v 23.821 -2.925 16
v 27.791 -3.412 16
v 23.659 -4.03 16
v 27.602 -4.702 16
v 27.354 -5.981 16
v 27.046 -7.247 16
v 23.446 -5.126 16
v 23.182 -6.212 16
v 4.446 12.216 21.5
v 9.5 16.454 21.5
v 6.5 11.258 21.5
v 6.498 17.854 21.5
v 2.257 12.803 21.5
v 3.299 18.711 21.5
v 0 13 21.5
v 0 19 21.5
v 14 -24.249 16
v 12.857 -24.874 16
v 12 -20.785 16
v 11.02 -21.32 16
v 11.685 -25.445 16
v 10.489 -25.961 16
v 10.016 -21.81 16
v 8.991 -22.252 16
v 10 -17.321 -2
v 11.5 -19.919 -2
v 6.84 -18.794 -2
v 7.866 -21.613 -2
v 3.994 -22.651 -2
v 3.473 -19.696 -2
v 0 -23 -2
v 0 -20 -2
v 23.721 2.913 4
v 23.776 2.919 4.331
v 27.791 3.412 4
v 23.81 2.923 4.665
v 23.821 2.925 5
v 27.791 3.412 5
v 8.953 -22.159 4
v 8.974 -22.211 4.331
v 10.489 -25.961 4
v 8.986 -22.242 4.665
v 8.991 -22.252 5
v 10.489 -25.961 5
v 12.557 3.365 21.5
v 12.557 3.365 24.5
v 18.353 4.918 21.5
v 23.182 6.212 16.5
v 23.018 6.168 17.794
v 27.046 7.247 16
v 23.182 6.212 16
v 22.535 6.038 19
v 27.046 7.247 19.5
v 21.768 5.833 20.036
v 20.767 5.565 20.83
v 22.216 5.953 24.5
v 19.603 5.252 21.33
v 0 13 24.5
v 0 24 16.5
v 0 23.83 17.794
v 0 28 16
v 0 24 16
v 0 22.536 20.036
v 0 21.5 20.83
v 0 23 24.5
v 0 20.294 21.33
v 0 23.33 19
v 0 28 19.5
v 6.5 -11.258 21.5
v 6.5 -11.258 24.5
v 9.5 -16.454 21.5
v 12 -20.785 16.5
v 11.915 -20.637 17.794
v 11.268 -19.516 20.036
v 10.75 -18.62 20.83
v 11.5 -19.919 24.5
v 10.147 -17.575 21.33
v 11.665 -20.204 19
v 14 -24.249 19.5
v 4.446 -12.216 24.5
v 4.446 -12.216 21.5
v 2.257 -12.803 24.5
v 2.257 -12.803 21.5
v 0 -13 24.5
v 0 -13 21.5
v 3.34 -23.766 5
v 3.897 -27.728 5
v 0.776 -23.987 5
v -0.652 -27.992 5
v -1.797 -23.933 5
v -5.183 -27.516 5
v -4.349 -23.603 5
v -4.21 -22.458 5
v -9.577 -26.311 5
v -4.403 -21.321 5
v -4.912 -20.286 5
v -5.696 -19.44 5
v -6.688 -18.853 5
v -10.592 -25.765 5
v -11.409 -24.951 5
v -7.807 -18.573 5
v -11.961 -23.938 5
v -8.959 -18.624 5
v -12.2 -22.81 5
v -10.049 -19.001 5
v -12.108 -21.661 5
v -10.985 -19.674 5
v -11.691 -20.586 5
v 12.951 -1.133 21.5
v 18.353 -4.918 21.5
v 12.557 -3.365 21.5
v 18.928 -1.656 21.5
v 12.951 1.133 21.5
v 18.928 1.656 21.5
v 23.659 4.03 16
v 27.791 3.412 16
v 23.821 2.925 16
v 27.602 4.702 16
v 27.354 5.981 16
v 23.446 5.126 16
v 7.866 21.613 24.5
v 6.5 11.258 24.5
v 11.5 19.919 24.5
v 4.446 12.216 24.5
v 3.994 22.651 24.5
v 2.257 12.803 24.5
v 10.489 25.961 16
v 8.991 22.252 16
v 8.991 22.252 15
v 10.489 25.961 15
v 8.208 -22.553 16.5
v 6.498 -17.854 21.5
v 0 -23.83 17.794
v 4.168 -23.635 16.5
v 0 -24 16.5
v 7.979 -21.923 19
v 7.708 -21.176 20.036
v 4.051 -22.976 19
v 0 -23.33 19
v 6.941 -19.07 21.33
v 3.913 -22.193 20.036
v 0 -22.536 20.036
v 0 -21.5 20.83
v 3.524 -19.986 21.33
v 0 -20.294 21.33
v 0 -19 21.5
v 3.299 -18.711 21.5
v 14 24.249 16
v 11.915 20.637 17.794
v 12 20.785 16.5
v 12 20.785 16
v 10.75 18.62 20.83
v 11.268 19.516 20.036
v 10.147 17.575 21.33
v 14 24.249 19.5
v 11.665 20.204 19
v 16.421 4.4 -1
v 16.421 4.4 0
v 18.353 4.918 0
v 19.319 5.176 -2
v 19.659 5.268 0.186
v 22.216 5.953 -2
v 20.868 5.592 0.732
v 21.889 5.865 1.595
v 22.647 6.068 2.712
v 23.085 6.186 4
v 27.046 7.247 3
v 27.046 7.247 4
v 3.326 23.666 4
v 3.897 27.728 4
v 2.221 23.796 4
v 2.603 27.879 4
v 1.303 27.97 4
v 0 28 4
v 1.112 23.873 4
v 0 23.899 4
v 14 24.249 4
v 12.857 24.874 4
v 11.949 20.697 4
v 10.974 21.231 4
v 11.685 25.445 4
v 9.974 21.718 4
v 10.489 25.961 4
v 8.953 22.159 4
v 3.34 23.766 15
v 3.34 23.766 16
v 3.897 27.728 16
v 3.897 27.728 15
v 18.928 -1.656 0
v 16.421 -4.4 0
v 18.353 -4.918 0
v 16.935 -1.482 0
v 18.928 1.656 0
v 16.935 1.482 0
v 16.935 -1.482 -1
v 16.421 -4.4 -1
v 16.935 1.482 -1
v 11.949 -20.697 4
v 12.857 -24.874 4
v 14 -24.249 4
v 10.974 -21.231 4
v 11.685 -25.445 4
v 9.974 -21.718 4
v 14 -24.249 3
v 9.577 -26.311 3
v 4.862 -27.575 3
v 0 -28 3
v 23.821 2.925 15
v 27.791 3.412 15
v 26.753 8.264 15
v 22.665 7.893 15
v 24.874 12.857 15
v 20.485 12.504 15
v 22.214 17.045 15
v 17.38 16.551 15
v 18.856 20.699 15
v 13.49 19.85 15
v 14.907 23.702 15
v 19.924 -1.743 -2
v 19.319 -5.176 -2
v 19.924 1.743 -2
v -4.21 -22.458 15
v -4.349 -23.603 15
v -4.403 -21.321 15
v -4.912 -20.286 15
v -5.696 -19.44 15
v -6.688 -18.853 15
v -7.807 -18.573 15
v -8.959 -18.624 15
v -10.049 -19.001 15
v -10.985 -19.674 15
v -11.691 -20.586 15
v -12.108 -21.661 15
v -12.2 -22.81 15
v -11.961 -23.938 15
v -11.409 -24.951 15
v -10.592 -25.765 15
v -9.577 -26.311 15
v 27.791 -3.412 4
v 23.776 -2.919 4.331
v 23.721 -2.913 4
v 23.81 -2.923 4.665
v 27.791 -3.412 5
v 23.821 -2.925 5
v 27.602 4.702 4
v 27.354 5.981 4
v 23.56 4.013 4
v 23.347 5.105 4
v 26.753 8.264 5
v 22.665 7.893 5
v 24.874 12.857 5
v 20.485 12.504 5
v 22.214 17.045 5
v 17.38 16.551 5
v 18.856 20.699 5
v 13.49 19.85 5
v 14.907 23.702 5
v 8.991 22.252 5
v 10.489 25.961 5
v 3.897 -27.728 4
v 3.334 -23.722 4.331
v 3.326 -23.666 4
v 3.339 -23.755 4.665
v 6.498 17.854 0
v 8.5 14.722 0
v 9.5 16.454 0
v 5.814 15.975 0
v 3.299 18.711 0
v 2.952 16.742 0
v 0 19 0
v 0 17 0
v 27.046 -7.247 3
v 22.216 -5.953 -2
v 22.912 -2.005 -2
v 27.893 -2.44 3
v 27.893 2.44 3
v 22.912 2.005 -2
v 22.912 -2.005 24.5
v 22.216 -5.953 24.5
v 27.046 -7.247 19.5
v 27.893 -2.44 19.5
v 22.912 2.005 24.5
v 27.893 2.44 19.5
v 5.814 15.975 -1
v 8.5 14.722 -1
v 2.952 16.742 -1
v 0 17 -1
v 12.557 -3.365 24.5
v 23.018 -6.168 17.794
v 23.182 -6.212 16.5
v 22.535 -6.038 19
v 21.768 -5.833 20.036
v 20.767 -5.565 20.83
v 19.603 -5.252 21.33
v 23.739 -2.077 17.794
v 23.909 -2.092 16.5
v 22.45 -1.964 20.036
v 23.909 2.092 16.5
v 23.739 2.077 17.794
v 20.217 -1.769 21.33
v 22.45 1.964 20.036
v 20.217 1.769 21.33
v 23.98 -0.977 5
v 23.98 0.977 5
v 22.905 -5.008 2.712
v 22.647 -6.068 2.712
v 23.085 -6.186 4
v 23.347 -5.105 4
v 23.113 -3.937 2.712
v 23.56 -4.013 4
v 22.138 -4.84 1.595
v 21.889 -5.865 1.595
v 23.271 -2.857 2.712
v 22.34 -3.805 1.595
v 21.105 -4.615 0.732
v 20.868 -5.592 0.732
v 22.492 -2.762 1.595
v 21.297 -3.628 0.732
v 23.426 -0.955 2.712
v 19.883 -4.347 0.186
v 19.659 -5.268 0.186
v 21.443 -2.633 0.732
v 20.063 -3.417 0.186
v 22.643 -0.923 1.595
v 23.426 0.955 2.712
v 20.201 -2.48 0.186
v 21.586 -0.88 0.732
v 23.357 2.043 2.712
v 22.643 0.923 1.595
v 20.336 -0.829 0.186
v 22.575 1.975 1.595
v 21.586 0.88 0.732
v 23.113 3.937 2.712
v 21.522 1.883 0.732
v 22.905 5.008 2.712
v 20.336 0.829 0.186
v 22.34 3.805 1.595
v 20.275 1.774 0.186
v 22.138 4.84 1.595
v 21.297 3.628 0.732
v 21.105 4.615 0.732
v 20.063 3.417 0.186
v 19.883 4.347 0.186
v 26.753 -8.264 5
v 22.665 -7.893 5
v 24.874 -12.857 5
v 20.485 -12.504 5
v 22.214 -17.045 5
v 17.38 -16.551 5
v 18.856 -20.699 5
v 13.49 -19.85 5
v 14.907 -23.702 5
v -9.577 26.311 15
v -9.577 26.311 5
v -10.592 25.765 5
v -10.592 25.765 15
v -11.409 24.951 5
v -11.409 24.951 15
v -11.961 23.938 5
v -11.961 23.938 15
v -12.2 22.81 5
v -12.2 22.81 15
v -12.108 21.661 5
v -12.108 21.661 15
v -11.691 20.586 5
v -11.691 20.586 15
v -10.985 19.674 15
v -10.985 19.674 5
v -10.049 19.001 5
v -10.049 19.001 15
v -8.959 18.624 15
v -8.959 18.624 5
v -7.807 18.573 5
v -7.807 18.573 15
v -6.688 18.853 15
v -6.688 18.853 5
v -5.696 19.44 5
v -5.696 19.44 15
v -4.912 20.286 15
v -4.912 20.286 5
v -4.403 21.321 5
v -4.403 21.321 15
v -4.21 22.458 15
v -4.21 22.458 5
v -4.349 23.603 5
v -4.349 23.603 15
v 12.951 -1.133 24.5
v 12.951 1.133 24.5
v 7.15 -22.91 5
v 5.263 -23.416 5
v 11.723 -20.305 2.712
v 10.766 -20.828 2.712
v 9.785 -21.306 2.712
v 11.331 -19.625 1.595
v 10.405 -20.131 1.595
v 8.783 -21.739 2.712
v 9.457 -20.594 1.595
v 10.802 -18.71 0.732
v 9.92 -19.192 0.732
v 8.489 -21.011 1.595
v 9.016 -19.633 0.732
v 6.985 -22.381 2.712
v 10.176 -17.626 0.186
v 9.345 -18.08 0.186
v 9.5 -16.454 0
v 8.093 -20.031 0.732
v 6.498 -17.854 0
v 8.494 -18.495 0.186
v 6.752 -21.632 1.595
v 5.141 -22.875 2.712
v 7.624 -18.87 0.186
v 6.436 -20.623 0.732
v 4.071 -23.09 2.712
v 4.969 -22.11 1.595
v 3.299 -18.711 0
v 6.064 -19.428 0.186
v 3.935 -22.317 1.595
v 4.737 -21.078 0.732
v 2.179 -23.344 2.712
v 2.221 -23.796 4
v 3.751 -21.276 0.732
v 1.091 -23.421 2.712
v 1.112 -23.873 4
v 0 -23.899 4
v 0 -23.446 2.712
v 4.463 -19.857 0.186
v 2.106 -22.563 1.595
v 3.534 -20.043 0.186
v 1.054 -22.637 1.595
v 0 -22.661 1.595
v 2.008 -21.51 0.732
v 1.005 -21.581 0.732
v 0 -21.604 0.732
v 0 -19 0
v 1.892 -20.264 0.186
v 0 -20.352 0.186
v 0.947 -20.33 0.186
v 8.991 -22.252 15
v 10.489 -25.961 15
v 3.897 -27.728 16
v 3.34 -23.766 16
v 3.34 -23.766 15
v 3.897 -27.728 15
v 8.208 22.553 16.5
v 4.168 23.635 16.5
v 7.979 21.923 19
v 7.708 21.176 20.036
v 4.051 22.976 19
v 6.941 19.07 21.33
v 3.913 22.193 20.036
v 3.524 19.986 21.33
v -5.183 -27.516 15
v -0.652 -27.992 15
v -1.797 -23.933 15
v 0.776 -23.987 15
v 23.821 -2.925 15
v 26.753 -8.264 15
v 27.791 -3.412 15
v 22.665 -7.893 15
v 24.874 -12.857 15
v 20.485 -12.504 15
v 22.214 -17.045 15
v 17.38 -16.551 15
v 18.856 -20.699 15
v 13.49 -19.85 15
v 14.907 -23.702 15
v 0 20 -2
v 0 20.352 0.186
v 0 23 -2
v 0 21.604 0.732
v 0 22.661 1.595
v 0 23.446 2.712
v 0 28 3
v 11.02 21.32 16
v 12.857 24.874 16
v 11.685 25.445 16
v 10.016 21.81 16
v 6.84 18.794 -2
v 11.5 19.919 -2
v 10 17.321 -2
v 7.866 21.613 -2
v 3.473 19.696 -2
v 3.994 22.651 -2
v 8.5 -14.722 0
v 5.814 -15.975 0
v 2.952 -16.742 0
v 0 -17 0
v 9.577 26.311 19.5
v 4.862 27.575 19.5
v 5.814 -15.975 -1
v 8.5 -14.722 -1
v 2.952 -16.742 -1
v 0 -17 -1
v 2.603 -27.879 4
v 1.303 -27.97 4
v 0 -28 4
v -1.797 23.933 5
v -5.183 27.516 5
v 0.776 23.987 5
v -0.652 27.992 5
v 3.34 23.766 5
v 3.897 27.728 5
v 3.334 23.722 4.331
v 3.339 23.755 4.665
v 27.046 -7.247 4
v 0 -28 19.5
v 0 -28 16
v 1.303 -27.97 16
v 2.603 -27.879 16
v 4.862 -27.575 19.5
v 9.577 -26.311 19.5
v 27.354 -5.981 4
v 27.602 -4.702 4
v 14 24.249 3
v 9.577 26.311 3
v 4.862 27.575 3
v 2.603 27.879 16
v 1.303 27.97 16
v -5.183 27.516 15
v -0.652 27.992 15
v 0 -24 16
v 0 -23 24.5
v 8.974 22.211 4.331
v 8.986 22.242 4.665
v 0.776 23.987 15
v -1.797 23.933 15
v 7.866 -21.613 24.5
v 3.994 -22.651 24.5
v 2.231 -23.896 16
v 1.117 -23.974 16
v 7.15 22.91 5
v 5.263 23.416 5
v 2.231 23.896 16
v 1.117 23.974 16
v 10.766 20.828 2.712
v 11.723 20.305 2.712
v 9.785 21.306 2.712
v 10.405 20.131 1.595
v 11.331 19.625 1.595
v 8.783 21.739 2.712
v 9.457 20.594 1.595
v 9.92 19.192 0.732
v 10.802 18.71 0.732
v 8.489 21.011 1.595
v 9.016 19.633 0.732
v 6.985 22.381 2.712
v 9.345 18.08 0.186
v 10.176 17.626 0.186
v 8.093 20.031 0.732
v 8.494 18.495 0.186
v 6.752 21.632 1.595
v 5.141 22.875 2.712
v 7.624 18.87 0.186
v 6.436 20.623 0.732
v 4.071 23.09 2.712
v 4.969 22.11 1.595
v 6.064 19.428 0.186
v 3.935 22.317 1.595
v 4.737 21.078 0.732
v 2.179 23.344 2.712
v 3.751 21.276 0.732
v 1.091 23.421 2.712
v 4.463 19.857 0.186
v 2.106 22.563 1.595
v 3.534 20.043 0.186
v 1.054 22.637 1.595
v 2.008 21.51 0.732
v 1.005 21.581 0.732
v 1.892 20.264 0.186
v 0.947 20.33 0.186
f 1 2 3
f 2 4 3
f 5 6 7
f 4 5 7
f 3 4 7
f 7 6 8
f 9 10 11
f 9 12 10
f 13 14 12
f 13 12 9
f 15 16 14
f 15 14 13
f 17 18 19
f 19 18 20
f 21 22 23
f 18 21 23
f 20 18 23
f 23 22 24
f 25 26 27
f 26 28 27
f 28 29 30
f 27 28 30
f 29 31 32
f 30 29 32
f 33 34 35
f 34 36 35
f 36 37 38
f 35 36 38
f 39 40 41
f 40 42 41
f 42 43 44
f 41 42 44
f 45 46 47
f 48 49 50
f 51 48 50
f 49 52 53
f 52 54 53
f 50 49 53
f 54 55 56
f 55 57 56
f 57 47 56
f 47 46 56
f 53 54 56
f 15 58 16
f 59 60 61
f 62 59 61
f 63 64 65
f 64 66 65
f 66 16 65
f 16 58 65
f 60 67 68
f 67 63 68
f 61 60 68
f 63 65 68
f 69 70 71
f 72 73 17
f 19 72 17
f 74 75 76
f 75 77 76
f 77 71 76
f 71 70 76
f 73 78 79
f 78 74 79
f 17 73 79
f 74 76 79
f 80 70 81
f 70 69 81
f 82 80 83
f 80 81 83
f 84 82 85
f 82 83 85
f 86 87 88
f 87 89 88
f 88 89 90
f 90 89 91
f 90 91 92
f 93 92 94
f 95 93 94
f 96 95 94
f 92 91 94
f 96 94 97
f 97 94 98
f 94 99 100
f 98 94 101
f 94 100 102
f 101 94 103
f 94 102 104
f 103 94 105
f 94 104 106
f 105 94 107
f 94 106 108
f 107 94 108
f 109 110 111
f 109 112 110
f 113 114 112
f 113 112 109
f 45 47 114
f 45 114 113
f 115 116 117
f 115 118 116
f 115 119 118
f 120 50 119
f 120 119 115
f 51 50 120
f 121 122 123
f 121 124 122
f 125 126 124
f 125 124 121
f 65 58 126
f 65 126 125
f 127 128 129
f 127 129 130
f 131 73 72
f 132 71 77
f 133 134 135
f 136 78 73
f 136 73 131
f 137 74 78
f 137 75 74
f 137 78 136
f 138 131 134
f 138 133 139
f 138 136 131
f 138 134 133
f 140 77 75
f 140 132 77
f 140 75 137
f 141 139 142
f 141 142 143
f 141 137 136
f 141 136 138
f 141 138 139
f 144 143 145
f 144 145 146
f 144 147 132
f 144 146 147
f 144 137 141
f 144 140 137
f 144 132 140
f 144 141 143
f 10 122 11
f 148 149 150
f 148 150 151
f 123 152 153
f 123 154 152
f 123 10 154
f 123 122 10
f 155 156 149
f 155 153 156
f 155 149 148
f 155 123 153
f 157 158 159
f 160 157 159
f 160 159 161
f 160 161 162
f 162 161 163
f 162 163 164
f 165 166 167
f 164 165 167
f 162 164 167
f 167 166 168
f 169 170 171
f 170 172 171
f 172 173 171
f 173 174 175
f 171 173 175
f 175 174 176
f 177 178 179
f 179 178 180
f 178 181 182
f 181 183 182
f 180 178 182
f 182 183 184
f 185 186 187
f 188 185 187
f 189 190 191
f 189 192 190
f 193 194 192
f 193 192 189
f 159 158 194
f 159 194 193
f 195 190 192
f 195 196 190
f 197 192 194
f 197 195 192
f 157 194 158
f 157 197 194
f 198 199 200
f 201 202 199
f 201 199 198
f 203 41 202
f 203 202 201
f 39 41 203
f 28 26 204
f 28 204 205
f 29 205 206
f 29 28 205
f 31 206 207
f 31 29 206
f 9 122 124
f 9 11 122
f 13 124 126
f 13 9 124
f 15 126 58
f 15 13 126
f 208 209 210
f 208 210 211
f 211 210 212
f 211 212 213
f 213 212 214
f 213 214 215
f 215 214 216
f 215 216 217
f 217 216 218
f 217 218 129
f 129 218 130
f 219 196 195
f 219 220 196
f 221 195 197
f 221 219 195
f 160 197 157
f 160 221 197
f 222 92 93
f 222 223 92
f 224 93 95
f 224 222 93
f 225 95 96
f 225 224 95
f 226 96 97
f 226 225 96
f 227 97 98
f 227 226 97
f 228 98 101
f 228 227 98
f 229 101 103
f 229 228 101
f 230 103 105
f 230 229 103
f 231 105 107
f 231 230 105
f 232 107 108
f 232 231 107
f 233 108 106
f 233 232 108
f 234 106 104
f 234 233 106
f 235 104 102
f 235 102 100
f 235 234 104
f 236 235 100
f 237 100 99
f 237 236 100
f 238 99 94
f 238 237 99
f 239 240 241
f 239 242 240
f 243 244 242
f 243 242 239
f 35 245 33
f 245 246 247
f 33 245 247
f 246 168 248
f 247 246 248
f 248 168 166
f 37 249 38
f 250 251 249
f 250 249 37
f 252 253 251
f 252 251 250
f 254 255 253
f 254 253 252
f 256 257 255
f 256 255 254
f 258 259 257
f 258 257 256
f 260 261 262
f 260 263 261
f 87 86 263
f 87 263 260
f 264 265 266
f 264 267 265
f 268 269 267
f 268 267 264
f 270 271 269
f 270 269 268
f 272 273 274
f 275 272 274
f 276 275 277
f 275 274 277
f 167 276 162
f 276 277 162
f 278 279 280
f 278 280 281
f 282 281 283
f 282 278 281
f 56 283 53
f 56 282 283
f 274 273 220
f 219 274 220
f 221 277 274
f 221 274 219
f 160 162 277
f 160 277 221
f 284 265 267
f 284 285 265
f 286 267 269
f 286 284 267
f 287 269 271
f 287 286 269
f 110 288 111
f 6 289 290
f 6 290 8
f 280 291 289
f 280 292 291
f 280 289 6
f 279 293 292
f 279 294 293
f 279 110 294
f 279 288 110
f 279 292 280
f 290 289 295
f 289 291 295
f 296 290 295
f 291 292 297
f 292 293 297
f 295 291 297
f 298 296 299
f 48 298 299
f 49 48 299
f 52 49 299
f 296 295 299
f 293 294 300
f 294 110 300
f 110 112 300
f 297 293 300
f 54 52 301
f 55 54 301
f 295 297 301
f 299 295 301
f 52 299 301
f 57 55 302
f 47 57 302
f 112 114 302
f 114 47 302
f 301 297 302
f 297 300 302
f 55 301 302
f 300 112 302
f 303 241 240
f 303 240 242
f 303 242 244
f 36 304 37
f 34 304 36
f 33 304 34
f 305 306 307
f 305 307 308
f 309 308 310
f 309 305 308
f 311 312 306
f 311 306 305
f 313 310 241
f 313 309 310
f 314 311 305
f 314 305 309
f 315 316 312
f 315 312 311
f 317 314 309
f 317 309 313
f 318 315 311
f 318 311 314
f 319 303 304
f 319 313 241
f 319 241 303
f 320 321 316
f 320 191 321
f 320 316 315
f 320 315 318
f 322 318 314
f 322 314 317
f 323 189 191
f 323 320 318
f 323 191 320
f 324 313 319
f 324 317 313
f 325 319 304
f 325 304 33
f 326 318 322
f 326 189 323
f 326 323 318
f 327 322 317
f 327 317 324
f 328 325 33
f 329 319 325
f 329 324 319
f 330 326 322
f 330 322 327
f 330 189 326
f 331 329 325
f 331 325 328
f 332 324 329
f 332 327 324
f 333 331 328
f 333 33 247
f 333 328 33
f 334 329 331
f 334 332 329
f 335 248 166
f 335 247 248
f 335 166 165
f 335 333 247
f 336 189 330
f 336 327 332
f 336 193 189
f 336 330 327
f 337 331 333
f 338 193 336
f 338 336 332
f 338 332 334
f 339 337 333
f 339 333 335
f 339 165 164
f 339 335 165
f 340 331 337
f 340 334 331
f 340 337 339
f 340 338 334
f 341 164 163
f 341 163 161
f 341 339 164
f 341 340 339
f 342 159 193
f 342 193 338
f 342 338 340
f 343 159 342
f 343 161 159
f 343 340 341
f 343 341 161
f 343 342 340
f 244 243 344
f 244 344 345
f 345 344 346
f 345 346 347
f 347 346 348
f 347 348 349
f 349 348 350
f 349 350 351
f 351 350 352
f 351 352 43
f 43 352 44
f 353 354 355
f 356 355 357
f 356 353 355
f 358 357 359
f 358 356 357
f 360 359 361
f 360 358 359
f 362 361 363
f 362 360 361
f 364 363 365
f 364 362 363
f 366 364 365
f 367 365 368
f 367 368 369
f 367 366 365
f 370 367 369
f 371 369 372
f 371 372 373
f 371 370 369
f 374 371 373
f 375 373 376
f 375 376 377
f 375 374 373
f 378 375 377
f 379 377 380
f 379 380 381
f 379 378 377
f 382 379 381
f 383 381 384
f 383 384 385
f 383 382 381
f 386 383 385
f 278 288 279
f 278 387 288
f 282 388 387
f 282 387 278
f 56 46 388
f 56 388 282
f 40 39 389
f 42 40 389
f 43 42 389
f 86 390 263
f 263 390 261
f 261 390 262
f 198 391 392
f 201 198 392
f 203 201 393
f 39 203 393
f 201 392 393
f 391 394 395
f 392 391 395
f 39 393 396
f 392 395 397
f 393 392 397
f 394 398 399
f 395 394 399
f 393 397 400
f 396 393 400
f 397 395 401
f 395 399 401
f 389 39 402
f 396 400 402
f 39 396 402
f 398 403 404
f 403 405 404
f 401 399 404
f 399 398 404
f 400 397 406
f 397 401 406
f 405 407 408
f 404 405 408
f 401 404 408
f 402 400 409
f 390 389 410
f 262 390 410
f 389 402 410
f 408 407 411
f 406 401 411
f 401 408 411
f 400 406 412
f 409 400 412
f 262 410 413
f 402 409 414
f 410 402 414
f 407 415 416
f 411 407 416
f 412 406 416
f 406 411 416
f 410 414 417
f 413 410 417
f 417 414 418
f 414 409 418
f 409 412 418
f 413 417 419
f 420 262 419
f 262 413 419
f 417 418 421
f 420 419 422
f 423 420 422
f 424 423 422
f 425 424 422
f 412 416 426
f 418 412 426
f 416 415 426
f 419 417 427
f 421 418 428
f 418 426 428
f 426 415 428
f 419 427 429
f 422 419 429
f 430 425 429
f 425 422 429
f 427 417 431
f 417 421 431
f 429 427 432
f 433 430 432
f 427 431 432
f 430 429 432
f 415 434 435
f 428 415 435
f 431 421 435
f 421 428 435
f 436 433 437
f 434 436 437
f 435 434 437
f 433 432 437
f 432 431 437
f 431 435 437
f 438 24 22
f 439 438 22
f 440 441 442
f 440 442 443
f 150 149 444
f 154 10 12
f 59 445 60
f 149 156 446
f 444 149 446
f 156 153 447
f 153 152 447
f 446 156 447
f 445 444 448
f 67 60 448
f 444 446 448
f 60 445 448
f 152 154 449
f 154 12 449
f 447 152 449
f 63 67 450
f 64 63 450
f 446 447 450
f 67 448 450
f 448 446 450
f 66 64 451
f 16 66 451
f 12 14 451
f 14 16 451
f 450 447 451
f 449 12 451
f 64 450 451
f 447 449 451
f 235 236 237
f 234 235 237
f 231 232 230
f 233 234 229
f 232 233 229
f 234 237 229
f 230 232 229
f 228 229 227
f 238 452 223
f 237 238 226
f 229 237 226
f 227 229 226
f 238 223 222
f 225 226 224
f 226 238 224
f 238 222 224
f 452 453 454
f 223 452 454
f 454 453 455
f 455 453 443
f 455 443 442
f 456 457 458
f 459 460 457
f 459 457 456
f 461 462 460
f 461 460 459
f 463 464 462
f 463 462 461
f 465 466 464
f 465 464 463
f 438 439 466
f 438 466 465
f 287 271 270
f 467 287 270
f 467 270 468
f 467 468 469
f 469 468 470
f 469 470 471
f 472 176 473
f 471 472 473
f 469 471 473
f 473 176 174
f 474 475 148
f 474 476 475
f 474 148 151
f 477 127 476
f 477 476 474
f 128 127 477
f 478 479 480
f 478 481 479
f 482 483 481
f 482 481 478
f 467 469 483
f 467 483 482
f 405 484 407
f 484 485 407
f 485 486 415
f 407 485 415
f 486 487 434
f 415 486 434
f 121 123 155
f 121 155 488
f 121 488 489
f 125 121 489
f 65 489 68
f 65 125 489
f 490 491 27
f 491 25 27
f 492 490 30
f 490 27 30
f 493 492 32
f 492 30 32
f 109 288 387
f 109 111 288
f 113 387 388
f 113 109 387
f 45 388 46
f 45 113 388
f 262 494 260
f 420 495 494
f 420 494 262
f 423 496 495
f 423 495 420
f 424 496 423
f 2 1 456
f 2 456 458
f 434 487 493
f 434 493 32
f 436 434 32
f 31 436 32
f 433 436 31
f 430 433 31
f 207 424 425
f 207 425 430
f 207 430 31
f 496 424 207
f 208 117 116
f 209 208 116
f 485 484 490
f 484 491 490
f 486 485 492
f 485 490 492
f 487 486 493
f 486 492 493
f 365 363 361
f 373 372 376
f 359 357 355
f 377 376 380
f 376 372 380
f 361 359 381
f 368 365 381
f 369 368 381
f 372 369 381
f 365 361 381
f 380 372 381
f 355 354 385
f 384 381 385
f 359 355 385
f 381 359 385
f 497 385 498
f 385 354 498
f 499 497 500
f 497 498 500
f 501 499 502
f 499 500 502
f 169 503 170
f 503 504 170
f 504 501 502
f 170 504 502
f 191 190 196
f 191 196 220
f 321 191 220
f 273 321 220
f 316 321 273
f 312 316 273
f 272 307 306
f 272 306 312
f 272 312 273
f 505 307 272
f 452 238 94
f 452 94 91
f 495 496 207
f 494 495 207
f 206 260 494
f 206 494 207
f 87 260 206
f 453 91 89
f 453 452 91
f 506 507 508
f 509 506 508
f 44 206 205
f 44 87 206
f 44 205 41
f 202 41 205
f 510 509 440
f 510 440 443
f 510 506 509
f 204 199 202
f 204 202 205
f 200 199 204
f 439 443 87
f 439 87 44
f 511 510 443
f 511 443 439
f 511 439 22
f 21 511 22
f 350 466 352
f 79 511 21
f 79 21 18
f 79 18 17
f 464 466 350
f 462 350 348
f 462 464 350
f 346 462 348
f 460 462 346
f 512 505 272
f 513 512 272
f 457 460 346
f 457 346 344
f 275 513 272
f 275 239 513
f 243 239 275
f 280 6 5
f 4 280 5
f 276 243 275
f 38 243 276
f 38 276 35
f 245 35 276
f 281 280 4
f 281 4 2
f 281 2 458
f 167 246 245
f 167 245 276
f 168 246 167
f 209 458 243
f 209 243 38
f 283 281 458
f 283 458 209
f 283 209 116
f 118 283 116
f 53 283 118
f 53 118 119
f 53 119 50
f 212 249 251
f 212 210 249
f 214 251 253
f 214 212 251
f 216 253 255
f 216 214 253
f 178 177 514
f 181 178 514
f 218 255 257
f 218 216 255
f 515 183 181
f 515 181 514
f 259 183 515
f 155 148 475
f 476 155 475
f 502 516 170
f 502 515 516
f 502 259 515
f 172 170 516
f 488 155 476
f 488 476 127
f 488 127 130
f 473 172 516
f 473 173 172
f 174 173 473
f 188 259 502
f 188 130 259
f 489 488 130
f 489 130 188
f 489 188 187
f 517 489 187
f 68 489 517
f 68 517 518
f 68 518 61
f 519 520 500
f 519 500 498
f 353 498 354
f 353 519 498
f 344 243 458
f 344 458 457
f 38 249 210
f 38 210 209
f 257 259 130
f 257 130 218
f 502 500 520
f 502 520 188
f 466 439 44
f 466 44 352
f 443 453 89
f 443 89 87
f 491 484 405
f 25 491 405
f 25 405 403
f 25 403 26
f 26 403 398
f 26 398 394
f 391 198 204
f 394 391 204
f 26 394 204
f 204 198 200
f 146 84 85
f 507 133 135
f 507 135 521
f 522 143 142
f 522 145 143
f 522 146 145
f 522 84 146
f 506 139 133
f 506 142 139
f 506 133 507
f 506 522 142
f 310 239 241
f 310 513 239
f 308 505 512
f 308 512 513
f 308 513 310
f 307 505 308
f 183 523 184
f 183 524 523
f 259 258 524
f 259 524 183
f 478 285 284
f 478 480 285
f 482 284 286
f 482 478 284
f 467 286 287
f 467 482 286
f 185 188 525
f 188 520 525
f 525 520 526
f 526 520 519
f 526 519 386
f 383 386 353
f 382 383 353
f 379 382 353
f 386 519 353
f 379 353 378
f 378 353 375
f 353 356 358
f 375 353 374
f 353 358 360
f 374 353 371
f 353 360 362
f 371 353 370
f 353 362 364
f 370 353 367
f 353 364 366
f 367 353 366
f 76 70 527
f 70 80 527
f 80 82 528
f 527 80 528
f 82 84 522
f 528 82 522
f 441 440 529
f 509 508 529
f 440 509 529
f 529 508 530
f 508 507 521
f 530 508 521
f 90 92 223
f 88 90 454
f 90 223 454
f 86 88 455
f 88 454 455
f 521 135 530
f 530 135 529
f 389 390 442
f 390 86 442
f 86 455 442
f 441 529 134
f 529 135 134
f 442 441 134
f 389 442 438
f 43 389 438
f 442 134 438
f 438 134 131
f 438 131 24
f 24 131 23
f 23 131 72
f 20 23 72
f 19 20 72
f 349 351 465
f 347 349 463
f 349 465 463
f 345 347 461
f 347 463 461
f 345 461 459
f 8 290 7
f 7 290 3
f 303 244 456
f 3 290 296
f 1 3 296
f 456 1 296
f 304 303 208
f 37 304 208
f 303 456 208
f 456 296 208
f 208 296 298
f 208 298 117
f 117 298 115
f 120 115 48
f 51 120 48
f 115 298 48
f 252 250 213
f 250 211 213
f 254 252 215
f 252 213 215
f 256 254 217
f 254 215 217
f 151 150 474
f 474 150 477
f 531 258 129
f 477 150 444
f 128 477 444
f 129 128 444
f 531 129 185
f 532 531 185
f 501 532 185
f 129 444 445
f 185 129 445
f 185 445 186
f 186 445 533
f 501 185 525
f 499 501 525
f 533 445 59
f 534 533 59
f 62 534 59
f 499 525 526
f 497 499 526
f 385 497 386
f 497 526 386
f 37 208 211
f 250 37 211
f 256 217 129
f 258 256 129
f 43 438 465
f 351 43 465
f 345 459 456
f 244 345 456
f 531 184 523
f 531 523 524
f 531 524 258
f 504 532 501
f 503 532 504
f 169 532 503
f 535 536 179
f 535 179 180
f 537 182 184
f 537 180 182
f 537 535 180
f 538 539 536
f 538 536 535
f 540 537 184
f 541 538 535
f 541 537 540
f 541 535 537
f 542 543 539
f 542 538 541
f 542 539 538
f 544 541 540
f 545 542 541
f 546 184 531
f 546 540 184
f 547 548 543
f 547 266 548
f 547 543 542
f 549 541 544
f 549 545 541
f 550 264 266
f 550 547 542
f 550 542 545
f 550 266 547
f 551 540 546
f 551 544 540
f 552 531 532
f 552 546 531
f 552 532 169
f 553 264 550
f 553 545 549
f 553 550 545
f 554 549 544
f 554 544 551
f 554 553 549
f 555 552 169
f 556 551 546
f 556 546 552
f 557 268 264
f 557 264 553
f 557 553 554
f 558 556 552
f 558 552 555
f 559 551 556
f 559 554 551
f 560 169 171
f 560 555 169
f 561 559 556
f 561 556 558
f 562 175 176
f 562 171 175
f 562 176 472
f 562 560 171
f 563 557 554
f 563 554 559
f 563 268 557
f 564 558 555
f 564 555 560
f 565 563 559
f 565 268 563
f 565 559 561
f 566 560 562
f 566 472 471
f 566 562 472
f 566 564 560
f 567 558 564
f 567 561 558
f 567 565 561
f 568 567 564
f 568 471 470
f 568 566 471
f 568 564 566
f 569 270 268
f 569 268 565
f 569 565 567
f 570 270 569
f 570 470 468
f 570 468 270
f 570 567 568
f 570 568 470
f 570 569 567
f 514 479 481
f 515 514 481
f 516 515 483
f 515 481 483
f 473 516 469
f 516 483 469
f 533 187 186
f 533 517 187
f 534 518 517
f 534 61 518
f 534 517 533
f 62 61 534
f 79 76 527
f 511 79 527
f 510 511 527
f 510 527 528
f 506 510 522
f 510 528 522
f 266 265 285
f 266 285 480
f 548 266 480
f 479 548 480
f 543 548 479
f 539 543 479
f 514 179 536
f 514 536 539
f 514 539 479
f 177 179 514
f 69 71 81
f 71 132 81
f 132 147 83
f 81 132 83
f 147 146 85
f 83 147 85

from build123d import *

# Parameters (mm, degrees)
F0_W            = 4
F0_H            = 10
F1_ANGLE_BACK   = 110
F1_ANGLE        = 220
F2_ANGLE_START  = 60
F2_ANGLE        = 30
F3_ANGLE_START  = 60
F3_ANGLE        = 30
F4_ANGLE_BACK   = 15
F4_ANGLE        = 30
F5_R            = 4
F6_DEPTH        = 10
F7_R            = 5
F8_SIZE         = 5
F9_W            = 10
F9_H            = 1
F10_ANGLE_START = 7
F10_ANGLE       = 13
F11_ANGLE_START = 7
F11_ANGLE       = 13
F12_ANGLE_START = 82
F12_ANGLE       = 13
F13_ANGLE_START = 82
F13_ANGLE       = 13
F14_ANGLE_START = 55
F14_ANGLE       = 13
F15_ANGLE_START = 55
F15_ANGLE       = 13


with BuildPart() as f1:
    # F0 (on Front) → F1 (revolve)
    with BuildSketch(Plane.XZ, mode=Mode.PRIVATE) as f1_sk:
        with Locations((26, 10)):
            Rectangle(F0_W, F0_H)
    revolve(f1_sk.sketch.rotate(Axis((0, 0, 10), (0, 0, 1)), -F1_ANGLE_BACK), axis=Axis((0, 0, 10), (0, 0, 1)), revolution_arc=F1_ANGLE)

    # F0 (on Front) → F2 (revolve)
    with BuildSketch(Plane.XZ, mode=Mode.PRIVATE) as f2_sk:
        Polygon((24, 21.5), (24, 15), (28, 15), (28, 24.5), (13, 24.5), (13, 21.5), align=None)
        Polygon((28, 5), (24, 5), (24, 0), (17, 0), (17, -1), (20, -2), (28, -2), align=None)
    revolve(f2_sk.sketch.rotate(Axis((0, 0, 10), (0, 0, -1)), F2_ANGLE_START), axis=Axis((0, 0, 10), (0, 0, -1)), revolution_arc=F2_ANGLE)

    # F0 (on Front) → F3 (revolve)
    with BuildSketch(Plane.XZ, mode=Mode.PRIVATE) as f3_sk:
        Polygon((24, 21.5), (24, 15), (28, 15), (28, 24.5), (13, 24.5), (13, 21.5), align=None)
        Polygon((28, 5), (24, 5), (24, 0), (17, 0), (17, -1), (20, -2), (28, -2), align=None)
    revolve(f3_sk.sketch.rotate(Axis((0, 0, 10), (0, 0, 1)), F3_ANGLE_START), axis=Axis((0, 0, 10), (0, 0, 1)), revolution_arc=F3_ANGLE)

    # F0 (on Front) → F4 (revolve)
    with BuildSketch(Plane.XZ, mode=Mode.PRIVATE) as f4_sk:
        Polygon((24, 21.5), (24, 15), (28, 15), (28, 24.5), (13, 24.5), (13, 21.5), align=None)
        Polygon((28, 5), (24, 5), (24, 0), (17, 0), (17, -1), (20, -2), (28, -2), align=None)
    revolve(f4_sk.sketch.rotate(Axis((0, 0, 10), (0, 0, 1)), -F4_ANGLE_BACK), axis=Axis((0, 0, 10), (0, 0, 1)), revolution_arc=F4_ANGLE)

    # F5 (on face) → F6 (join, through all)
    with BuildSketch(Plane.XY.offset(15)):
        with Locations((-8.2084834398, 22.5526228989)):
            Circle(F5_R)
        with Locations((-8.2084834398, -22.5526228989)):
            Circle(F5_R)
    extrude(amount=-F6_DEPTH)

    # F7
    f7_edges = [f1.edges().sort_by_distance(p)[0] for p in [
        (24, 0, 21.5),
        (6.211657, 23.18222, 21.5),
        (6.211657, -23.18222, 21.5),
        (6.211657, -23.18222, 0),
        (6.211657, 23.18222, 0),
        (24, 0, 0),
    ]]
    fillet(f7_edges, radius=F7_R)

    # F8
    f8_edges = [f1.edges().sort_by_distance(p)[0] for p in [
        (7.246933, 27.045923, 24.5),
        (28, 0, 24.5),
        (7.246933, -27.045923, 24.5),
        (7.246933, -27.045923, -2),
        (7.246933, 27.045923, -2),
        (28, 0, -2),
    ]]
    chamfer(f8_edges, length=F8_SIZE)

    # F9 (on Front) → F10 (revolve, cut)
    with BuildSketch(Plane.XZ, mode=Mode.PRIVATE) as f10_sk:
        with Locations((27, 15.5)):
            Rectangle(F9_W, F9_H)
        with Locations((27, 4.5)):
            Rectangle(F9_W, F9_H)
    revolve(f10_sk.sketch.rotate(Axis((0, 0, 10), (0, 0, -1)), F10_ANGLE_START), axis=Axis((0, 0, 10), (0, 0, -1)), revolution_arc=F10_ANGLE, mode=Mode.SUBTRACT)

    # F9 (on Front) → F11 (revolve, cut)
    with BuildSketch(Plane.XZ, mode=Mode.PRIVATE) as f11_sk:
        with Locations((27, 15.5)):
            Rectangle(F9_W, F9_H)
        with Locations((27, 4.5)):
            Rectangle(F9_W, F9_H)
    revolve(f11_sk.sketch.rotate(Axis((0, 0, 10), (0, 0, 1)), F11_ANGLE_START), axis=Axis((0, 0, 10), (0, 0, 1)), revolution_arc=F11_ANGLE, mode=Mode.SUBTRACT)

    # F9 (on Front) → F12 (revolve, cut)
    with BuildSketch(Plane.XZ, mode=Mode.PRIVATE) as f12_sk:
        with Locations((27, 15.5)):
            Rectangle(F9_W, F9_H)
        with Locations((27, 4.5)):
            Rectangle(F9_W, F9_H)
    revolve(f12_sk.sketch.rotate(Axis((0, 0, 10), (0, 0, 1)), F12_ANGLE_START), axis=Axis((0, 0, 10), (0, 0, 1)), revolution_arc=F12_ANGLE, mode=Mode.SUBTRACT)

    # F9 (on Front) → F13 (revolve, cut)
    with BuildSketch(Plane.XZ, mode=Mode.PRIVATE) as f13_sk:
        with Locations((27, 15.5)):
            Rectangle(F9_W, F9_H)
        with Locations((27, 4.5)):
            Rectangle(F9_W, F9_H)
    revolve(f13_sk.sketch.rotate(Axis((0, 0, 10), (0, 0, -1)), F13_ANGLE_START), axis=Axis((0, 0, 10), (0, 0, -1)), revolution_arc=F13_ANGLE, mode=Mode.SUBTRACT)

    # F9 (on Front) → F14 (revolve, cut)
    with BuildSketch(Plane.XZ, mode=Mode.PRIVATE) as f14_sk:
        with Locations((27, 15.5)):
            Rectangle(F9_W, F9_H)
        with Locations((27, 4.5)):
            Rectangle(F9_W, F9_H)
    revolve(f14_sk.sketch.rotate(Axis((0, 0, 10), (0, 0, -1)), F14_ANGLE_START), axis=Axis((0, 0, 10), (0, 0, -1)), revolution_arc=F14_ANGLE, mode=Mode.SUBTRACT)

    # F9 (on Front) → F15 (revolve, cut)
    with BuildSketch(Plane.XZ, mode=Mode.PRIVATE) as f15_sk:
        with Locations((27, 15.5)):
            Rectangle(F9_W, F9_H)
        with Locations((27, 4.5)):
            Rectangle(F9_W, F9_H)
    revolve(f15_sk.sketch.rotate(Axis((0, 0, 10), (0, 0, 1)), F15_ANGLE_START), axis=Axis((0, 0, 10), (0, 0, 1)), revolution_arc=F15_ANGLE, mode=Mode.SUBTRACT)


solid = f1.part
